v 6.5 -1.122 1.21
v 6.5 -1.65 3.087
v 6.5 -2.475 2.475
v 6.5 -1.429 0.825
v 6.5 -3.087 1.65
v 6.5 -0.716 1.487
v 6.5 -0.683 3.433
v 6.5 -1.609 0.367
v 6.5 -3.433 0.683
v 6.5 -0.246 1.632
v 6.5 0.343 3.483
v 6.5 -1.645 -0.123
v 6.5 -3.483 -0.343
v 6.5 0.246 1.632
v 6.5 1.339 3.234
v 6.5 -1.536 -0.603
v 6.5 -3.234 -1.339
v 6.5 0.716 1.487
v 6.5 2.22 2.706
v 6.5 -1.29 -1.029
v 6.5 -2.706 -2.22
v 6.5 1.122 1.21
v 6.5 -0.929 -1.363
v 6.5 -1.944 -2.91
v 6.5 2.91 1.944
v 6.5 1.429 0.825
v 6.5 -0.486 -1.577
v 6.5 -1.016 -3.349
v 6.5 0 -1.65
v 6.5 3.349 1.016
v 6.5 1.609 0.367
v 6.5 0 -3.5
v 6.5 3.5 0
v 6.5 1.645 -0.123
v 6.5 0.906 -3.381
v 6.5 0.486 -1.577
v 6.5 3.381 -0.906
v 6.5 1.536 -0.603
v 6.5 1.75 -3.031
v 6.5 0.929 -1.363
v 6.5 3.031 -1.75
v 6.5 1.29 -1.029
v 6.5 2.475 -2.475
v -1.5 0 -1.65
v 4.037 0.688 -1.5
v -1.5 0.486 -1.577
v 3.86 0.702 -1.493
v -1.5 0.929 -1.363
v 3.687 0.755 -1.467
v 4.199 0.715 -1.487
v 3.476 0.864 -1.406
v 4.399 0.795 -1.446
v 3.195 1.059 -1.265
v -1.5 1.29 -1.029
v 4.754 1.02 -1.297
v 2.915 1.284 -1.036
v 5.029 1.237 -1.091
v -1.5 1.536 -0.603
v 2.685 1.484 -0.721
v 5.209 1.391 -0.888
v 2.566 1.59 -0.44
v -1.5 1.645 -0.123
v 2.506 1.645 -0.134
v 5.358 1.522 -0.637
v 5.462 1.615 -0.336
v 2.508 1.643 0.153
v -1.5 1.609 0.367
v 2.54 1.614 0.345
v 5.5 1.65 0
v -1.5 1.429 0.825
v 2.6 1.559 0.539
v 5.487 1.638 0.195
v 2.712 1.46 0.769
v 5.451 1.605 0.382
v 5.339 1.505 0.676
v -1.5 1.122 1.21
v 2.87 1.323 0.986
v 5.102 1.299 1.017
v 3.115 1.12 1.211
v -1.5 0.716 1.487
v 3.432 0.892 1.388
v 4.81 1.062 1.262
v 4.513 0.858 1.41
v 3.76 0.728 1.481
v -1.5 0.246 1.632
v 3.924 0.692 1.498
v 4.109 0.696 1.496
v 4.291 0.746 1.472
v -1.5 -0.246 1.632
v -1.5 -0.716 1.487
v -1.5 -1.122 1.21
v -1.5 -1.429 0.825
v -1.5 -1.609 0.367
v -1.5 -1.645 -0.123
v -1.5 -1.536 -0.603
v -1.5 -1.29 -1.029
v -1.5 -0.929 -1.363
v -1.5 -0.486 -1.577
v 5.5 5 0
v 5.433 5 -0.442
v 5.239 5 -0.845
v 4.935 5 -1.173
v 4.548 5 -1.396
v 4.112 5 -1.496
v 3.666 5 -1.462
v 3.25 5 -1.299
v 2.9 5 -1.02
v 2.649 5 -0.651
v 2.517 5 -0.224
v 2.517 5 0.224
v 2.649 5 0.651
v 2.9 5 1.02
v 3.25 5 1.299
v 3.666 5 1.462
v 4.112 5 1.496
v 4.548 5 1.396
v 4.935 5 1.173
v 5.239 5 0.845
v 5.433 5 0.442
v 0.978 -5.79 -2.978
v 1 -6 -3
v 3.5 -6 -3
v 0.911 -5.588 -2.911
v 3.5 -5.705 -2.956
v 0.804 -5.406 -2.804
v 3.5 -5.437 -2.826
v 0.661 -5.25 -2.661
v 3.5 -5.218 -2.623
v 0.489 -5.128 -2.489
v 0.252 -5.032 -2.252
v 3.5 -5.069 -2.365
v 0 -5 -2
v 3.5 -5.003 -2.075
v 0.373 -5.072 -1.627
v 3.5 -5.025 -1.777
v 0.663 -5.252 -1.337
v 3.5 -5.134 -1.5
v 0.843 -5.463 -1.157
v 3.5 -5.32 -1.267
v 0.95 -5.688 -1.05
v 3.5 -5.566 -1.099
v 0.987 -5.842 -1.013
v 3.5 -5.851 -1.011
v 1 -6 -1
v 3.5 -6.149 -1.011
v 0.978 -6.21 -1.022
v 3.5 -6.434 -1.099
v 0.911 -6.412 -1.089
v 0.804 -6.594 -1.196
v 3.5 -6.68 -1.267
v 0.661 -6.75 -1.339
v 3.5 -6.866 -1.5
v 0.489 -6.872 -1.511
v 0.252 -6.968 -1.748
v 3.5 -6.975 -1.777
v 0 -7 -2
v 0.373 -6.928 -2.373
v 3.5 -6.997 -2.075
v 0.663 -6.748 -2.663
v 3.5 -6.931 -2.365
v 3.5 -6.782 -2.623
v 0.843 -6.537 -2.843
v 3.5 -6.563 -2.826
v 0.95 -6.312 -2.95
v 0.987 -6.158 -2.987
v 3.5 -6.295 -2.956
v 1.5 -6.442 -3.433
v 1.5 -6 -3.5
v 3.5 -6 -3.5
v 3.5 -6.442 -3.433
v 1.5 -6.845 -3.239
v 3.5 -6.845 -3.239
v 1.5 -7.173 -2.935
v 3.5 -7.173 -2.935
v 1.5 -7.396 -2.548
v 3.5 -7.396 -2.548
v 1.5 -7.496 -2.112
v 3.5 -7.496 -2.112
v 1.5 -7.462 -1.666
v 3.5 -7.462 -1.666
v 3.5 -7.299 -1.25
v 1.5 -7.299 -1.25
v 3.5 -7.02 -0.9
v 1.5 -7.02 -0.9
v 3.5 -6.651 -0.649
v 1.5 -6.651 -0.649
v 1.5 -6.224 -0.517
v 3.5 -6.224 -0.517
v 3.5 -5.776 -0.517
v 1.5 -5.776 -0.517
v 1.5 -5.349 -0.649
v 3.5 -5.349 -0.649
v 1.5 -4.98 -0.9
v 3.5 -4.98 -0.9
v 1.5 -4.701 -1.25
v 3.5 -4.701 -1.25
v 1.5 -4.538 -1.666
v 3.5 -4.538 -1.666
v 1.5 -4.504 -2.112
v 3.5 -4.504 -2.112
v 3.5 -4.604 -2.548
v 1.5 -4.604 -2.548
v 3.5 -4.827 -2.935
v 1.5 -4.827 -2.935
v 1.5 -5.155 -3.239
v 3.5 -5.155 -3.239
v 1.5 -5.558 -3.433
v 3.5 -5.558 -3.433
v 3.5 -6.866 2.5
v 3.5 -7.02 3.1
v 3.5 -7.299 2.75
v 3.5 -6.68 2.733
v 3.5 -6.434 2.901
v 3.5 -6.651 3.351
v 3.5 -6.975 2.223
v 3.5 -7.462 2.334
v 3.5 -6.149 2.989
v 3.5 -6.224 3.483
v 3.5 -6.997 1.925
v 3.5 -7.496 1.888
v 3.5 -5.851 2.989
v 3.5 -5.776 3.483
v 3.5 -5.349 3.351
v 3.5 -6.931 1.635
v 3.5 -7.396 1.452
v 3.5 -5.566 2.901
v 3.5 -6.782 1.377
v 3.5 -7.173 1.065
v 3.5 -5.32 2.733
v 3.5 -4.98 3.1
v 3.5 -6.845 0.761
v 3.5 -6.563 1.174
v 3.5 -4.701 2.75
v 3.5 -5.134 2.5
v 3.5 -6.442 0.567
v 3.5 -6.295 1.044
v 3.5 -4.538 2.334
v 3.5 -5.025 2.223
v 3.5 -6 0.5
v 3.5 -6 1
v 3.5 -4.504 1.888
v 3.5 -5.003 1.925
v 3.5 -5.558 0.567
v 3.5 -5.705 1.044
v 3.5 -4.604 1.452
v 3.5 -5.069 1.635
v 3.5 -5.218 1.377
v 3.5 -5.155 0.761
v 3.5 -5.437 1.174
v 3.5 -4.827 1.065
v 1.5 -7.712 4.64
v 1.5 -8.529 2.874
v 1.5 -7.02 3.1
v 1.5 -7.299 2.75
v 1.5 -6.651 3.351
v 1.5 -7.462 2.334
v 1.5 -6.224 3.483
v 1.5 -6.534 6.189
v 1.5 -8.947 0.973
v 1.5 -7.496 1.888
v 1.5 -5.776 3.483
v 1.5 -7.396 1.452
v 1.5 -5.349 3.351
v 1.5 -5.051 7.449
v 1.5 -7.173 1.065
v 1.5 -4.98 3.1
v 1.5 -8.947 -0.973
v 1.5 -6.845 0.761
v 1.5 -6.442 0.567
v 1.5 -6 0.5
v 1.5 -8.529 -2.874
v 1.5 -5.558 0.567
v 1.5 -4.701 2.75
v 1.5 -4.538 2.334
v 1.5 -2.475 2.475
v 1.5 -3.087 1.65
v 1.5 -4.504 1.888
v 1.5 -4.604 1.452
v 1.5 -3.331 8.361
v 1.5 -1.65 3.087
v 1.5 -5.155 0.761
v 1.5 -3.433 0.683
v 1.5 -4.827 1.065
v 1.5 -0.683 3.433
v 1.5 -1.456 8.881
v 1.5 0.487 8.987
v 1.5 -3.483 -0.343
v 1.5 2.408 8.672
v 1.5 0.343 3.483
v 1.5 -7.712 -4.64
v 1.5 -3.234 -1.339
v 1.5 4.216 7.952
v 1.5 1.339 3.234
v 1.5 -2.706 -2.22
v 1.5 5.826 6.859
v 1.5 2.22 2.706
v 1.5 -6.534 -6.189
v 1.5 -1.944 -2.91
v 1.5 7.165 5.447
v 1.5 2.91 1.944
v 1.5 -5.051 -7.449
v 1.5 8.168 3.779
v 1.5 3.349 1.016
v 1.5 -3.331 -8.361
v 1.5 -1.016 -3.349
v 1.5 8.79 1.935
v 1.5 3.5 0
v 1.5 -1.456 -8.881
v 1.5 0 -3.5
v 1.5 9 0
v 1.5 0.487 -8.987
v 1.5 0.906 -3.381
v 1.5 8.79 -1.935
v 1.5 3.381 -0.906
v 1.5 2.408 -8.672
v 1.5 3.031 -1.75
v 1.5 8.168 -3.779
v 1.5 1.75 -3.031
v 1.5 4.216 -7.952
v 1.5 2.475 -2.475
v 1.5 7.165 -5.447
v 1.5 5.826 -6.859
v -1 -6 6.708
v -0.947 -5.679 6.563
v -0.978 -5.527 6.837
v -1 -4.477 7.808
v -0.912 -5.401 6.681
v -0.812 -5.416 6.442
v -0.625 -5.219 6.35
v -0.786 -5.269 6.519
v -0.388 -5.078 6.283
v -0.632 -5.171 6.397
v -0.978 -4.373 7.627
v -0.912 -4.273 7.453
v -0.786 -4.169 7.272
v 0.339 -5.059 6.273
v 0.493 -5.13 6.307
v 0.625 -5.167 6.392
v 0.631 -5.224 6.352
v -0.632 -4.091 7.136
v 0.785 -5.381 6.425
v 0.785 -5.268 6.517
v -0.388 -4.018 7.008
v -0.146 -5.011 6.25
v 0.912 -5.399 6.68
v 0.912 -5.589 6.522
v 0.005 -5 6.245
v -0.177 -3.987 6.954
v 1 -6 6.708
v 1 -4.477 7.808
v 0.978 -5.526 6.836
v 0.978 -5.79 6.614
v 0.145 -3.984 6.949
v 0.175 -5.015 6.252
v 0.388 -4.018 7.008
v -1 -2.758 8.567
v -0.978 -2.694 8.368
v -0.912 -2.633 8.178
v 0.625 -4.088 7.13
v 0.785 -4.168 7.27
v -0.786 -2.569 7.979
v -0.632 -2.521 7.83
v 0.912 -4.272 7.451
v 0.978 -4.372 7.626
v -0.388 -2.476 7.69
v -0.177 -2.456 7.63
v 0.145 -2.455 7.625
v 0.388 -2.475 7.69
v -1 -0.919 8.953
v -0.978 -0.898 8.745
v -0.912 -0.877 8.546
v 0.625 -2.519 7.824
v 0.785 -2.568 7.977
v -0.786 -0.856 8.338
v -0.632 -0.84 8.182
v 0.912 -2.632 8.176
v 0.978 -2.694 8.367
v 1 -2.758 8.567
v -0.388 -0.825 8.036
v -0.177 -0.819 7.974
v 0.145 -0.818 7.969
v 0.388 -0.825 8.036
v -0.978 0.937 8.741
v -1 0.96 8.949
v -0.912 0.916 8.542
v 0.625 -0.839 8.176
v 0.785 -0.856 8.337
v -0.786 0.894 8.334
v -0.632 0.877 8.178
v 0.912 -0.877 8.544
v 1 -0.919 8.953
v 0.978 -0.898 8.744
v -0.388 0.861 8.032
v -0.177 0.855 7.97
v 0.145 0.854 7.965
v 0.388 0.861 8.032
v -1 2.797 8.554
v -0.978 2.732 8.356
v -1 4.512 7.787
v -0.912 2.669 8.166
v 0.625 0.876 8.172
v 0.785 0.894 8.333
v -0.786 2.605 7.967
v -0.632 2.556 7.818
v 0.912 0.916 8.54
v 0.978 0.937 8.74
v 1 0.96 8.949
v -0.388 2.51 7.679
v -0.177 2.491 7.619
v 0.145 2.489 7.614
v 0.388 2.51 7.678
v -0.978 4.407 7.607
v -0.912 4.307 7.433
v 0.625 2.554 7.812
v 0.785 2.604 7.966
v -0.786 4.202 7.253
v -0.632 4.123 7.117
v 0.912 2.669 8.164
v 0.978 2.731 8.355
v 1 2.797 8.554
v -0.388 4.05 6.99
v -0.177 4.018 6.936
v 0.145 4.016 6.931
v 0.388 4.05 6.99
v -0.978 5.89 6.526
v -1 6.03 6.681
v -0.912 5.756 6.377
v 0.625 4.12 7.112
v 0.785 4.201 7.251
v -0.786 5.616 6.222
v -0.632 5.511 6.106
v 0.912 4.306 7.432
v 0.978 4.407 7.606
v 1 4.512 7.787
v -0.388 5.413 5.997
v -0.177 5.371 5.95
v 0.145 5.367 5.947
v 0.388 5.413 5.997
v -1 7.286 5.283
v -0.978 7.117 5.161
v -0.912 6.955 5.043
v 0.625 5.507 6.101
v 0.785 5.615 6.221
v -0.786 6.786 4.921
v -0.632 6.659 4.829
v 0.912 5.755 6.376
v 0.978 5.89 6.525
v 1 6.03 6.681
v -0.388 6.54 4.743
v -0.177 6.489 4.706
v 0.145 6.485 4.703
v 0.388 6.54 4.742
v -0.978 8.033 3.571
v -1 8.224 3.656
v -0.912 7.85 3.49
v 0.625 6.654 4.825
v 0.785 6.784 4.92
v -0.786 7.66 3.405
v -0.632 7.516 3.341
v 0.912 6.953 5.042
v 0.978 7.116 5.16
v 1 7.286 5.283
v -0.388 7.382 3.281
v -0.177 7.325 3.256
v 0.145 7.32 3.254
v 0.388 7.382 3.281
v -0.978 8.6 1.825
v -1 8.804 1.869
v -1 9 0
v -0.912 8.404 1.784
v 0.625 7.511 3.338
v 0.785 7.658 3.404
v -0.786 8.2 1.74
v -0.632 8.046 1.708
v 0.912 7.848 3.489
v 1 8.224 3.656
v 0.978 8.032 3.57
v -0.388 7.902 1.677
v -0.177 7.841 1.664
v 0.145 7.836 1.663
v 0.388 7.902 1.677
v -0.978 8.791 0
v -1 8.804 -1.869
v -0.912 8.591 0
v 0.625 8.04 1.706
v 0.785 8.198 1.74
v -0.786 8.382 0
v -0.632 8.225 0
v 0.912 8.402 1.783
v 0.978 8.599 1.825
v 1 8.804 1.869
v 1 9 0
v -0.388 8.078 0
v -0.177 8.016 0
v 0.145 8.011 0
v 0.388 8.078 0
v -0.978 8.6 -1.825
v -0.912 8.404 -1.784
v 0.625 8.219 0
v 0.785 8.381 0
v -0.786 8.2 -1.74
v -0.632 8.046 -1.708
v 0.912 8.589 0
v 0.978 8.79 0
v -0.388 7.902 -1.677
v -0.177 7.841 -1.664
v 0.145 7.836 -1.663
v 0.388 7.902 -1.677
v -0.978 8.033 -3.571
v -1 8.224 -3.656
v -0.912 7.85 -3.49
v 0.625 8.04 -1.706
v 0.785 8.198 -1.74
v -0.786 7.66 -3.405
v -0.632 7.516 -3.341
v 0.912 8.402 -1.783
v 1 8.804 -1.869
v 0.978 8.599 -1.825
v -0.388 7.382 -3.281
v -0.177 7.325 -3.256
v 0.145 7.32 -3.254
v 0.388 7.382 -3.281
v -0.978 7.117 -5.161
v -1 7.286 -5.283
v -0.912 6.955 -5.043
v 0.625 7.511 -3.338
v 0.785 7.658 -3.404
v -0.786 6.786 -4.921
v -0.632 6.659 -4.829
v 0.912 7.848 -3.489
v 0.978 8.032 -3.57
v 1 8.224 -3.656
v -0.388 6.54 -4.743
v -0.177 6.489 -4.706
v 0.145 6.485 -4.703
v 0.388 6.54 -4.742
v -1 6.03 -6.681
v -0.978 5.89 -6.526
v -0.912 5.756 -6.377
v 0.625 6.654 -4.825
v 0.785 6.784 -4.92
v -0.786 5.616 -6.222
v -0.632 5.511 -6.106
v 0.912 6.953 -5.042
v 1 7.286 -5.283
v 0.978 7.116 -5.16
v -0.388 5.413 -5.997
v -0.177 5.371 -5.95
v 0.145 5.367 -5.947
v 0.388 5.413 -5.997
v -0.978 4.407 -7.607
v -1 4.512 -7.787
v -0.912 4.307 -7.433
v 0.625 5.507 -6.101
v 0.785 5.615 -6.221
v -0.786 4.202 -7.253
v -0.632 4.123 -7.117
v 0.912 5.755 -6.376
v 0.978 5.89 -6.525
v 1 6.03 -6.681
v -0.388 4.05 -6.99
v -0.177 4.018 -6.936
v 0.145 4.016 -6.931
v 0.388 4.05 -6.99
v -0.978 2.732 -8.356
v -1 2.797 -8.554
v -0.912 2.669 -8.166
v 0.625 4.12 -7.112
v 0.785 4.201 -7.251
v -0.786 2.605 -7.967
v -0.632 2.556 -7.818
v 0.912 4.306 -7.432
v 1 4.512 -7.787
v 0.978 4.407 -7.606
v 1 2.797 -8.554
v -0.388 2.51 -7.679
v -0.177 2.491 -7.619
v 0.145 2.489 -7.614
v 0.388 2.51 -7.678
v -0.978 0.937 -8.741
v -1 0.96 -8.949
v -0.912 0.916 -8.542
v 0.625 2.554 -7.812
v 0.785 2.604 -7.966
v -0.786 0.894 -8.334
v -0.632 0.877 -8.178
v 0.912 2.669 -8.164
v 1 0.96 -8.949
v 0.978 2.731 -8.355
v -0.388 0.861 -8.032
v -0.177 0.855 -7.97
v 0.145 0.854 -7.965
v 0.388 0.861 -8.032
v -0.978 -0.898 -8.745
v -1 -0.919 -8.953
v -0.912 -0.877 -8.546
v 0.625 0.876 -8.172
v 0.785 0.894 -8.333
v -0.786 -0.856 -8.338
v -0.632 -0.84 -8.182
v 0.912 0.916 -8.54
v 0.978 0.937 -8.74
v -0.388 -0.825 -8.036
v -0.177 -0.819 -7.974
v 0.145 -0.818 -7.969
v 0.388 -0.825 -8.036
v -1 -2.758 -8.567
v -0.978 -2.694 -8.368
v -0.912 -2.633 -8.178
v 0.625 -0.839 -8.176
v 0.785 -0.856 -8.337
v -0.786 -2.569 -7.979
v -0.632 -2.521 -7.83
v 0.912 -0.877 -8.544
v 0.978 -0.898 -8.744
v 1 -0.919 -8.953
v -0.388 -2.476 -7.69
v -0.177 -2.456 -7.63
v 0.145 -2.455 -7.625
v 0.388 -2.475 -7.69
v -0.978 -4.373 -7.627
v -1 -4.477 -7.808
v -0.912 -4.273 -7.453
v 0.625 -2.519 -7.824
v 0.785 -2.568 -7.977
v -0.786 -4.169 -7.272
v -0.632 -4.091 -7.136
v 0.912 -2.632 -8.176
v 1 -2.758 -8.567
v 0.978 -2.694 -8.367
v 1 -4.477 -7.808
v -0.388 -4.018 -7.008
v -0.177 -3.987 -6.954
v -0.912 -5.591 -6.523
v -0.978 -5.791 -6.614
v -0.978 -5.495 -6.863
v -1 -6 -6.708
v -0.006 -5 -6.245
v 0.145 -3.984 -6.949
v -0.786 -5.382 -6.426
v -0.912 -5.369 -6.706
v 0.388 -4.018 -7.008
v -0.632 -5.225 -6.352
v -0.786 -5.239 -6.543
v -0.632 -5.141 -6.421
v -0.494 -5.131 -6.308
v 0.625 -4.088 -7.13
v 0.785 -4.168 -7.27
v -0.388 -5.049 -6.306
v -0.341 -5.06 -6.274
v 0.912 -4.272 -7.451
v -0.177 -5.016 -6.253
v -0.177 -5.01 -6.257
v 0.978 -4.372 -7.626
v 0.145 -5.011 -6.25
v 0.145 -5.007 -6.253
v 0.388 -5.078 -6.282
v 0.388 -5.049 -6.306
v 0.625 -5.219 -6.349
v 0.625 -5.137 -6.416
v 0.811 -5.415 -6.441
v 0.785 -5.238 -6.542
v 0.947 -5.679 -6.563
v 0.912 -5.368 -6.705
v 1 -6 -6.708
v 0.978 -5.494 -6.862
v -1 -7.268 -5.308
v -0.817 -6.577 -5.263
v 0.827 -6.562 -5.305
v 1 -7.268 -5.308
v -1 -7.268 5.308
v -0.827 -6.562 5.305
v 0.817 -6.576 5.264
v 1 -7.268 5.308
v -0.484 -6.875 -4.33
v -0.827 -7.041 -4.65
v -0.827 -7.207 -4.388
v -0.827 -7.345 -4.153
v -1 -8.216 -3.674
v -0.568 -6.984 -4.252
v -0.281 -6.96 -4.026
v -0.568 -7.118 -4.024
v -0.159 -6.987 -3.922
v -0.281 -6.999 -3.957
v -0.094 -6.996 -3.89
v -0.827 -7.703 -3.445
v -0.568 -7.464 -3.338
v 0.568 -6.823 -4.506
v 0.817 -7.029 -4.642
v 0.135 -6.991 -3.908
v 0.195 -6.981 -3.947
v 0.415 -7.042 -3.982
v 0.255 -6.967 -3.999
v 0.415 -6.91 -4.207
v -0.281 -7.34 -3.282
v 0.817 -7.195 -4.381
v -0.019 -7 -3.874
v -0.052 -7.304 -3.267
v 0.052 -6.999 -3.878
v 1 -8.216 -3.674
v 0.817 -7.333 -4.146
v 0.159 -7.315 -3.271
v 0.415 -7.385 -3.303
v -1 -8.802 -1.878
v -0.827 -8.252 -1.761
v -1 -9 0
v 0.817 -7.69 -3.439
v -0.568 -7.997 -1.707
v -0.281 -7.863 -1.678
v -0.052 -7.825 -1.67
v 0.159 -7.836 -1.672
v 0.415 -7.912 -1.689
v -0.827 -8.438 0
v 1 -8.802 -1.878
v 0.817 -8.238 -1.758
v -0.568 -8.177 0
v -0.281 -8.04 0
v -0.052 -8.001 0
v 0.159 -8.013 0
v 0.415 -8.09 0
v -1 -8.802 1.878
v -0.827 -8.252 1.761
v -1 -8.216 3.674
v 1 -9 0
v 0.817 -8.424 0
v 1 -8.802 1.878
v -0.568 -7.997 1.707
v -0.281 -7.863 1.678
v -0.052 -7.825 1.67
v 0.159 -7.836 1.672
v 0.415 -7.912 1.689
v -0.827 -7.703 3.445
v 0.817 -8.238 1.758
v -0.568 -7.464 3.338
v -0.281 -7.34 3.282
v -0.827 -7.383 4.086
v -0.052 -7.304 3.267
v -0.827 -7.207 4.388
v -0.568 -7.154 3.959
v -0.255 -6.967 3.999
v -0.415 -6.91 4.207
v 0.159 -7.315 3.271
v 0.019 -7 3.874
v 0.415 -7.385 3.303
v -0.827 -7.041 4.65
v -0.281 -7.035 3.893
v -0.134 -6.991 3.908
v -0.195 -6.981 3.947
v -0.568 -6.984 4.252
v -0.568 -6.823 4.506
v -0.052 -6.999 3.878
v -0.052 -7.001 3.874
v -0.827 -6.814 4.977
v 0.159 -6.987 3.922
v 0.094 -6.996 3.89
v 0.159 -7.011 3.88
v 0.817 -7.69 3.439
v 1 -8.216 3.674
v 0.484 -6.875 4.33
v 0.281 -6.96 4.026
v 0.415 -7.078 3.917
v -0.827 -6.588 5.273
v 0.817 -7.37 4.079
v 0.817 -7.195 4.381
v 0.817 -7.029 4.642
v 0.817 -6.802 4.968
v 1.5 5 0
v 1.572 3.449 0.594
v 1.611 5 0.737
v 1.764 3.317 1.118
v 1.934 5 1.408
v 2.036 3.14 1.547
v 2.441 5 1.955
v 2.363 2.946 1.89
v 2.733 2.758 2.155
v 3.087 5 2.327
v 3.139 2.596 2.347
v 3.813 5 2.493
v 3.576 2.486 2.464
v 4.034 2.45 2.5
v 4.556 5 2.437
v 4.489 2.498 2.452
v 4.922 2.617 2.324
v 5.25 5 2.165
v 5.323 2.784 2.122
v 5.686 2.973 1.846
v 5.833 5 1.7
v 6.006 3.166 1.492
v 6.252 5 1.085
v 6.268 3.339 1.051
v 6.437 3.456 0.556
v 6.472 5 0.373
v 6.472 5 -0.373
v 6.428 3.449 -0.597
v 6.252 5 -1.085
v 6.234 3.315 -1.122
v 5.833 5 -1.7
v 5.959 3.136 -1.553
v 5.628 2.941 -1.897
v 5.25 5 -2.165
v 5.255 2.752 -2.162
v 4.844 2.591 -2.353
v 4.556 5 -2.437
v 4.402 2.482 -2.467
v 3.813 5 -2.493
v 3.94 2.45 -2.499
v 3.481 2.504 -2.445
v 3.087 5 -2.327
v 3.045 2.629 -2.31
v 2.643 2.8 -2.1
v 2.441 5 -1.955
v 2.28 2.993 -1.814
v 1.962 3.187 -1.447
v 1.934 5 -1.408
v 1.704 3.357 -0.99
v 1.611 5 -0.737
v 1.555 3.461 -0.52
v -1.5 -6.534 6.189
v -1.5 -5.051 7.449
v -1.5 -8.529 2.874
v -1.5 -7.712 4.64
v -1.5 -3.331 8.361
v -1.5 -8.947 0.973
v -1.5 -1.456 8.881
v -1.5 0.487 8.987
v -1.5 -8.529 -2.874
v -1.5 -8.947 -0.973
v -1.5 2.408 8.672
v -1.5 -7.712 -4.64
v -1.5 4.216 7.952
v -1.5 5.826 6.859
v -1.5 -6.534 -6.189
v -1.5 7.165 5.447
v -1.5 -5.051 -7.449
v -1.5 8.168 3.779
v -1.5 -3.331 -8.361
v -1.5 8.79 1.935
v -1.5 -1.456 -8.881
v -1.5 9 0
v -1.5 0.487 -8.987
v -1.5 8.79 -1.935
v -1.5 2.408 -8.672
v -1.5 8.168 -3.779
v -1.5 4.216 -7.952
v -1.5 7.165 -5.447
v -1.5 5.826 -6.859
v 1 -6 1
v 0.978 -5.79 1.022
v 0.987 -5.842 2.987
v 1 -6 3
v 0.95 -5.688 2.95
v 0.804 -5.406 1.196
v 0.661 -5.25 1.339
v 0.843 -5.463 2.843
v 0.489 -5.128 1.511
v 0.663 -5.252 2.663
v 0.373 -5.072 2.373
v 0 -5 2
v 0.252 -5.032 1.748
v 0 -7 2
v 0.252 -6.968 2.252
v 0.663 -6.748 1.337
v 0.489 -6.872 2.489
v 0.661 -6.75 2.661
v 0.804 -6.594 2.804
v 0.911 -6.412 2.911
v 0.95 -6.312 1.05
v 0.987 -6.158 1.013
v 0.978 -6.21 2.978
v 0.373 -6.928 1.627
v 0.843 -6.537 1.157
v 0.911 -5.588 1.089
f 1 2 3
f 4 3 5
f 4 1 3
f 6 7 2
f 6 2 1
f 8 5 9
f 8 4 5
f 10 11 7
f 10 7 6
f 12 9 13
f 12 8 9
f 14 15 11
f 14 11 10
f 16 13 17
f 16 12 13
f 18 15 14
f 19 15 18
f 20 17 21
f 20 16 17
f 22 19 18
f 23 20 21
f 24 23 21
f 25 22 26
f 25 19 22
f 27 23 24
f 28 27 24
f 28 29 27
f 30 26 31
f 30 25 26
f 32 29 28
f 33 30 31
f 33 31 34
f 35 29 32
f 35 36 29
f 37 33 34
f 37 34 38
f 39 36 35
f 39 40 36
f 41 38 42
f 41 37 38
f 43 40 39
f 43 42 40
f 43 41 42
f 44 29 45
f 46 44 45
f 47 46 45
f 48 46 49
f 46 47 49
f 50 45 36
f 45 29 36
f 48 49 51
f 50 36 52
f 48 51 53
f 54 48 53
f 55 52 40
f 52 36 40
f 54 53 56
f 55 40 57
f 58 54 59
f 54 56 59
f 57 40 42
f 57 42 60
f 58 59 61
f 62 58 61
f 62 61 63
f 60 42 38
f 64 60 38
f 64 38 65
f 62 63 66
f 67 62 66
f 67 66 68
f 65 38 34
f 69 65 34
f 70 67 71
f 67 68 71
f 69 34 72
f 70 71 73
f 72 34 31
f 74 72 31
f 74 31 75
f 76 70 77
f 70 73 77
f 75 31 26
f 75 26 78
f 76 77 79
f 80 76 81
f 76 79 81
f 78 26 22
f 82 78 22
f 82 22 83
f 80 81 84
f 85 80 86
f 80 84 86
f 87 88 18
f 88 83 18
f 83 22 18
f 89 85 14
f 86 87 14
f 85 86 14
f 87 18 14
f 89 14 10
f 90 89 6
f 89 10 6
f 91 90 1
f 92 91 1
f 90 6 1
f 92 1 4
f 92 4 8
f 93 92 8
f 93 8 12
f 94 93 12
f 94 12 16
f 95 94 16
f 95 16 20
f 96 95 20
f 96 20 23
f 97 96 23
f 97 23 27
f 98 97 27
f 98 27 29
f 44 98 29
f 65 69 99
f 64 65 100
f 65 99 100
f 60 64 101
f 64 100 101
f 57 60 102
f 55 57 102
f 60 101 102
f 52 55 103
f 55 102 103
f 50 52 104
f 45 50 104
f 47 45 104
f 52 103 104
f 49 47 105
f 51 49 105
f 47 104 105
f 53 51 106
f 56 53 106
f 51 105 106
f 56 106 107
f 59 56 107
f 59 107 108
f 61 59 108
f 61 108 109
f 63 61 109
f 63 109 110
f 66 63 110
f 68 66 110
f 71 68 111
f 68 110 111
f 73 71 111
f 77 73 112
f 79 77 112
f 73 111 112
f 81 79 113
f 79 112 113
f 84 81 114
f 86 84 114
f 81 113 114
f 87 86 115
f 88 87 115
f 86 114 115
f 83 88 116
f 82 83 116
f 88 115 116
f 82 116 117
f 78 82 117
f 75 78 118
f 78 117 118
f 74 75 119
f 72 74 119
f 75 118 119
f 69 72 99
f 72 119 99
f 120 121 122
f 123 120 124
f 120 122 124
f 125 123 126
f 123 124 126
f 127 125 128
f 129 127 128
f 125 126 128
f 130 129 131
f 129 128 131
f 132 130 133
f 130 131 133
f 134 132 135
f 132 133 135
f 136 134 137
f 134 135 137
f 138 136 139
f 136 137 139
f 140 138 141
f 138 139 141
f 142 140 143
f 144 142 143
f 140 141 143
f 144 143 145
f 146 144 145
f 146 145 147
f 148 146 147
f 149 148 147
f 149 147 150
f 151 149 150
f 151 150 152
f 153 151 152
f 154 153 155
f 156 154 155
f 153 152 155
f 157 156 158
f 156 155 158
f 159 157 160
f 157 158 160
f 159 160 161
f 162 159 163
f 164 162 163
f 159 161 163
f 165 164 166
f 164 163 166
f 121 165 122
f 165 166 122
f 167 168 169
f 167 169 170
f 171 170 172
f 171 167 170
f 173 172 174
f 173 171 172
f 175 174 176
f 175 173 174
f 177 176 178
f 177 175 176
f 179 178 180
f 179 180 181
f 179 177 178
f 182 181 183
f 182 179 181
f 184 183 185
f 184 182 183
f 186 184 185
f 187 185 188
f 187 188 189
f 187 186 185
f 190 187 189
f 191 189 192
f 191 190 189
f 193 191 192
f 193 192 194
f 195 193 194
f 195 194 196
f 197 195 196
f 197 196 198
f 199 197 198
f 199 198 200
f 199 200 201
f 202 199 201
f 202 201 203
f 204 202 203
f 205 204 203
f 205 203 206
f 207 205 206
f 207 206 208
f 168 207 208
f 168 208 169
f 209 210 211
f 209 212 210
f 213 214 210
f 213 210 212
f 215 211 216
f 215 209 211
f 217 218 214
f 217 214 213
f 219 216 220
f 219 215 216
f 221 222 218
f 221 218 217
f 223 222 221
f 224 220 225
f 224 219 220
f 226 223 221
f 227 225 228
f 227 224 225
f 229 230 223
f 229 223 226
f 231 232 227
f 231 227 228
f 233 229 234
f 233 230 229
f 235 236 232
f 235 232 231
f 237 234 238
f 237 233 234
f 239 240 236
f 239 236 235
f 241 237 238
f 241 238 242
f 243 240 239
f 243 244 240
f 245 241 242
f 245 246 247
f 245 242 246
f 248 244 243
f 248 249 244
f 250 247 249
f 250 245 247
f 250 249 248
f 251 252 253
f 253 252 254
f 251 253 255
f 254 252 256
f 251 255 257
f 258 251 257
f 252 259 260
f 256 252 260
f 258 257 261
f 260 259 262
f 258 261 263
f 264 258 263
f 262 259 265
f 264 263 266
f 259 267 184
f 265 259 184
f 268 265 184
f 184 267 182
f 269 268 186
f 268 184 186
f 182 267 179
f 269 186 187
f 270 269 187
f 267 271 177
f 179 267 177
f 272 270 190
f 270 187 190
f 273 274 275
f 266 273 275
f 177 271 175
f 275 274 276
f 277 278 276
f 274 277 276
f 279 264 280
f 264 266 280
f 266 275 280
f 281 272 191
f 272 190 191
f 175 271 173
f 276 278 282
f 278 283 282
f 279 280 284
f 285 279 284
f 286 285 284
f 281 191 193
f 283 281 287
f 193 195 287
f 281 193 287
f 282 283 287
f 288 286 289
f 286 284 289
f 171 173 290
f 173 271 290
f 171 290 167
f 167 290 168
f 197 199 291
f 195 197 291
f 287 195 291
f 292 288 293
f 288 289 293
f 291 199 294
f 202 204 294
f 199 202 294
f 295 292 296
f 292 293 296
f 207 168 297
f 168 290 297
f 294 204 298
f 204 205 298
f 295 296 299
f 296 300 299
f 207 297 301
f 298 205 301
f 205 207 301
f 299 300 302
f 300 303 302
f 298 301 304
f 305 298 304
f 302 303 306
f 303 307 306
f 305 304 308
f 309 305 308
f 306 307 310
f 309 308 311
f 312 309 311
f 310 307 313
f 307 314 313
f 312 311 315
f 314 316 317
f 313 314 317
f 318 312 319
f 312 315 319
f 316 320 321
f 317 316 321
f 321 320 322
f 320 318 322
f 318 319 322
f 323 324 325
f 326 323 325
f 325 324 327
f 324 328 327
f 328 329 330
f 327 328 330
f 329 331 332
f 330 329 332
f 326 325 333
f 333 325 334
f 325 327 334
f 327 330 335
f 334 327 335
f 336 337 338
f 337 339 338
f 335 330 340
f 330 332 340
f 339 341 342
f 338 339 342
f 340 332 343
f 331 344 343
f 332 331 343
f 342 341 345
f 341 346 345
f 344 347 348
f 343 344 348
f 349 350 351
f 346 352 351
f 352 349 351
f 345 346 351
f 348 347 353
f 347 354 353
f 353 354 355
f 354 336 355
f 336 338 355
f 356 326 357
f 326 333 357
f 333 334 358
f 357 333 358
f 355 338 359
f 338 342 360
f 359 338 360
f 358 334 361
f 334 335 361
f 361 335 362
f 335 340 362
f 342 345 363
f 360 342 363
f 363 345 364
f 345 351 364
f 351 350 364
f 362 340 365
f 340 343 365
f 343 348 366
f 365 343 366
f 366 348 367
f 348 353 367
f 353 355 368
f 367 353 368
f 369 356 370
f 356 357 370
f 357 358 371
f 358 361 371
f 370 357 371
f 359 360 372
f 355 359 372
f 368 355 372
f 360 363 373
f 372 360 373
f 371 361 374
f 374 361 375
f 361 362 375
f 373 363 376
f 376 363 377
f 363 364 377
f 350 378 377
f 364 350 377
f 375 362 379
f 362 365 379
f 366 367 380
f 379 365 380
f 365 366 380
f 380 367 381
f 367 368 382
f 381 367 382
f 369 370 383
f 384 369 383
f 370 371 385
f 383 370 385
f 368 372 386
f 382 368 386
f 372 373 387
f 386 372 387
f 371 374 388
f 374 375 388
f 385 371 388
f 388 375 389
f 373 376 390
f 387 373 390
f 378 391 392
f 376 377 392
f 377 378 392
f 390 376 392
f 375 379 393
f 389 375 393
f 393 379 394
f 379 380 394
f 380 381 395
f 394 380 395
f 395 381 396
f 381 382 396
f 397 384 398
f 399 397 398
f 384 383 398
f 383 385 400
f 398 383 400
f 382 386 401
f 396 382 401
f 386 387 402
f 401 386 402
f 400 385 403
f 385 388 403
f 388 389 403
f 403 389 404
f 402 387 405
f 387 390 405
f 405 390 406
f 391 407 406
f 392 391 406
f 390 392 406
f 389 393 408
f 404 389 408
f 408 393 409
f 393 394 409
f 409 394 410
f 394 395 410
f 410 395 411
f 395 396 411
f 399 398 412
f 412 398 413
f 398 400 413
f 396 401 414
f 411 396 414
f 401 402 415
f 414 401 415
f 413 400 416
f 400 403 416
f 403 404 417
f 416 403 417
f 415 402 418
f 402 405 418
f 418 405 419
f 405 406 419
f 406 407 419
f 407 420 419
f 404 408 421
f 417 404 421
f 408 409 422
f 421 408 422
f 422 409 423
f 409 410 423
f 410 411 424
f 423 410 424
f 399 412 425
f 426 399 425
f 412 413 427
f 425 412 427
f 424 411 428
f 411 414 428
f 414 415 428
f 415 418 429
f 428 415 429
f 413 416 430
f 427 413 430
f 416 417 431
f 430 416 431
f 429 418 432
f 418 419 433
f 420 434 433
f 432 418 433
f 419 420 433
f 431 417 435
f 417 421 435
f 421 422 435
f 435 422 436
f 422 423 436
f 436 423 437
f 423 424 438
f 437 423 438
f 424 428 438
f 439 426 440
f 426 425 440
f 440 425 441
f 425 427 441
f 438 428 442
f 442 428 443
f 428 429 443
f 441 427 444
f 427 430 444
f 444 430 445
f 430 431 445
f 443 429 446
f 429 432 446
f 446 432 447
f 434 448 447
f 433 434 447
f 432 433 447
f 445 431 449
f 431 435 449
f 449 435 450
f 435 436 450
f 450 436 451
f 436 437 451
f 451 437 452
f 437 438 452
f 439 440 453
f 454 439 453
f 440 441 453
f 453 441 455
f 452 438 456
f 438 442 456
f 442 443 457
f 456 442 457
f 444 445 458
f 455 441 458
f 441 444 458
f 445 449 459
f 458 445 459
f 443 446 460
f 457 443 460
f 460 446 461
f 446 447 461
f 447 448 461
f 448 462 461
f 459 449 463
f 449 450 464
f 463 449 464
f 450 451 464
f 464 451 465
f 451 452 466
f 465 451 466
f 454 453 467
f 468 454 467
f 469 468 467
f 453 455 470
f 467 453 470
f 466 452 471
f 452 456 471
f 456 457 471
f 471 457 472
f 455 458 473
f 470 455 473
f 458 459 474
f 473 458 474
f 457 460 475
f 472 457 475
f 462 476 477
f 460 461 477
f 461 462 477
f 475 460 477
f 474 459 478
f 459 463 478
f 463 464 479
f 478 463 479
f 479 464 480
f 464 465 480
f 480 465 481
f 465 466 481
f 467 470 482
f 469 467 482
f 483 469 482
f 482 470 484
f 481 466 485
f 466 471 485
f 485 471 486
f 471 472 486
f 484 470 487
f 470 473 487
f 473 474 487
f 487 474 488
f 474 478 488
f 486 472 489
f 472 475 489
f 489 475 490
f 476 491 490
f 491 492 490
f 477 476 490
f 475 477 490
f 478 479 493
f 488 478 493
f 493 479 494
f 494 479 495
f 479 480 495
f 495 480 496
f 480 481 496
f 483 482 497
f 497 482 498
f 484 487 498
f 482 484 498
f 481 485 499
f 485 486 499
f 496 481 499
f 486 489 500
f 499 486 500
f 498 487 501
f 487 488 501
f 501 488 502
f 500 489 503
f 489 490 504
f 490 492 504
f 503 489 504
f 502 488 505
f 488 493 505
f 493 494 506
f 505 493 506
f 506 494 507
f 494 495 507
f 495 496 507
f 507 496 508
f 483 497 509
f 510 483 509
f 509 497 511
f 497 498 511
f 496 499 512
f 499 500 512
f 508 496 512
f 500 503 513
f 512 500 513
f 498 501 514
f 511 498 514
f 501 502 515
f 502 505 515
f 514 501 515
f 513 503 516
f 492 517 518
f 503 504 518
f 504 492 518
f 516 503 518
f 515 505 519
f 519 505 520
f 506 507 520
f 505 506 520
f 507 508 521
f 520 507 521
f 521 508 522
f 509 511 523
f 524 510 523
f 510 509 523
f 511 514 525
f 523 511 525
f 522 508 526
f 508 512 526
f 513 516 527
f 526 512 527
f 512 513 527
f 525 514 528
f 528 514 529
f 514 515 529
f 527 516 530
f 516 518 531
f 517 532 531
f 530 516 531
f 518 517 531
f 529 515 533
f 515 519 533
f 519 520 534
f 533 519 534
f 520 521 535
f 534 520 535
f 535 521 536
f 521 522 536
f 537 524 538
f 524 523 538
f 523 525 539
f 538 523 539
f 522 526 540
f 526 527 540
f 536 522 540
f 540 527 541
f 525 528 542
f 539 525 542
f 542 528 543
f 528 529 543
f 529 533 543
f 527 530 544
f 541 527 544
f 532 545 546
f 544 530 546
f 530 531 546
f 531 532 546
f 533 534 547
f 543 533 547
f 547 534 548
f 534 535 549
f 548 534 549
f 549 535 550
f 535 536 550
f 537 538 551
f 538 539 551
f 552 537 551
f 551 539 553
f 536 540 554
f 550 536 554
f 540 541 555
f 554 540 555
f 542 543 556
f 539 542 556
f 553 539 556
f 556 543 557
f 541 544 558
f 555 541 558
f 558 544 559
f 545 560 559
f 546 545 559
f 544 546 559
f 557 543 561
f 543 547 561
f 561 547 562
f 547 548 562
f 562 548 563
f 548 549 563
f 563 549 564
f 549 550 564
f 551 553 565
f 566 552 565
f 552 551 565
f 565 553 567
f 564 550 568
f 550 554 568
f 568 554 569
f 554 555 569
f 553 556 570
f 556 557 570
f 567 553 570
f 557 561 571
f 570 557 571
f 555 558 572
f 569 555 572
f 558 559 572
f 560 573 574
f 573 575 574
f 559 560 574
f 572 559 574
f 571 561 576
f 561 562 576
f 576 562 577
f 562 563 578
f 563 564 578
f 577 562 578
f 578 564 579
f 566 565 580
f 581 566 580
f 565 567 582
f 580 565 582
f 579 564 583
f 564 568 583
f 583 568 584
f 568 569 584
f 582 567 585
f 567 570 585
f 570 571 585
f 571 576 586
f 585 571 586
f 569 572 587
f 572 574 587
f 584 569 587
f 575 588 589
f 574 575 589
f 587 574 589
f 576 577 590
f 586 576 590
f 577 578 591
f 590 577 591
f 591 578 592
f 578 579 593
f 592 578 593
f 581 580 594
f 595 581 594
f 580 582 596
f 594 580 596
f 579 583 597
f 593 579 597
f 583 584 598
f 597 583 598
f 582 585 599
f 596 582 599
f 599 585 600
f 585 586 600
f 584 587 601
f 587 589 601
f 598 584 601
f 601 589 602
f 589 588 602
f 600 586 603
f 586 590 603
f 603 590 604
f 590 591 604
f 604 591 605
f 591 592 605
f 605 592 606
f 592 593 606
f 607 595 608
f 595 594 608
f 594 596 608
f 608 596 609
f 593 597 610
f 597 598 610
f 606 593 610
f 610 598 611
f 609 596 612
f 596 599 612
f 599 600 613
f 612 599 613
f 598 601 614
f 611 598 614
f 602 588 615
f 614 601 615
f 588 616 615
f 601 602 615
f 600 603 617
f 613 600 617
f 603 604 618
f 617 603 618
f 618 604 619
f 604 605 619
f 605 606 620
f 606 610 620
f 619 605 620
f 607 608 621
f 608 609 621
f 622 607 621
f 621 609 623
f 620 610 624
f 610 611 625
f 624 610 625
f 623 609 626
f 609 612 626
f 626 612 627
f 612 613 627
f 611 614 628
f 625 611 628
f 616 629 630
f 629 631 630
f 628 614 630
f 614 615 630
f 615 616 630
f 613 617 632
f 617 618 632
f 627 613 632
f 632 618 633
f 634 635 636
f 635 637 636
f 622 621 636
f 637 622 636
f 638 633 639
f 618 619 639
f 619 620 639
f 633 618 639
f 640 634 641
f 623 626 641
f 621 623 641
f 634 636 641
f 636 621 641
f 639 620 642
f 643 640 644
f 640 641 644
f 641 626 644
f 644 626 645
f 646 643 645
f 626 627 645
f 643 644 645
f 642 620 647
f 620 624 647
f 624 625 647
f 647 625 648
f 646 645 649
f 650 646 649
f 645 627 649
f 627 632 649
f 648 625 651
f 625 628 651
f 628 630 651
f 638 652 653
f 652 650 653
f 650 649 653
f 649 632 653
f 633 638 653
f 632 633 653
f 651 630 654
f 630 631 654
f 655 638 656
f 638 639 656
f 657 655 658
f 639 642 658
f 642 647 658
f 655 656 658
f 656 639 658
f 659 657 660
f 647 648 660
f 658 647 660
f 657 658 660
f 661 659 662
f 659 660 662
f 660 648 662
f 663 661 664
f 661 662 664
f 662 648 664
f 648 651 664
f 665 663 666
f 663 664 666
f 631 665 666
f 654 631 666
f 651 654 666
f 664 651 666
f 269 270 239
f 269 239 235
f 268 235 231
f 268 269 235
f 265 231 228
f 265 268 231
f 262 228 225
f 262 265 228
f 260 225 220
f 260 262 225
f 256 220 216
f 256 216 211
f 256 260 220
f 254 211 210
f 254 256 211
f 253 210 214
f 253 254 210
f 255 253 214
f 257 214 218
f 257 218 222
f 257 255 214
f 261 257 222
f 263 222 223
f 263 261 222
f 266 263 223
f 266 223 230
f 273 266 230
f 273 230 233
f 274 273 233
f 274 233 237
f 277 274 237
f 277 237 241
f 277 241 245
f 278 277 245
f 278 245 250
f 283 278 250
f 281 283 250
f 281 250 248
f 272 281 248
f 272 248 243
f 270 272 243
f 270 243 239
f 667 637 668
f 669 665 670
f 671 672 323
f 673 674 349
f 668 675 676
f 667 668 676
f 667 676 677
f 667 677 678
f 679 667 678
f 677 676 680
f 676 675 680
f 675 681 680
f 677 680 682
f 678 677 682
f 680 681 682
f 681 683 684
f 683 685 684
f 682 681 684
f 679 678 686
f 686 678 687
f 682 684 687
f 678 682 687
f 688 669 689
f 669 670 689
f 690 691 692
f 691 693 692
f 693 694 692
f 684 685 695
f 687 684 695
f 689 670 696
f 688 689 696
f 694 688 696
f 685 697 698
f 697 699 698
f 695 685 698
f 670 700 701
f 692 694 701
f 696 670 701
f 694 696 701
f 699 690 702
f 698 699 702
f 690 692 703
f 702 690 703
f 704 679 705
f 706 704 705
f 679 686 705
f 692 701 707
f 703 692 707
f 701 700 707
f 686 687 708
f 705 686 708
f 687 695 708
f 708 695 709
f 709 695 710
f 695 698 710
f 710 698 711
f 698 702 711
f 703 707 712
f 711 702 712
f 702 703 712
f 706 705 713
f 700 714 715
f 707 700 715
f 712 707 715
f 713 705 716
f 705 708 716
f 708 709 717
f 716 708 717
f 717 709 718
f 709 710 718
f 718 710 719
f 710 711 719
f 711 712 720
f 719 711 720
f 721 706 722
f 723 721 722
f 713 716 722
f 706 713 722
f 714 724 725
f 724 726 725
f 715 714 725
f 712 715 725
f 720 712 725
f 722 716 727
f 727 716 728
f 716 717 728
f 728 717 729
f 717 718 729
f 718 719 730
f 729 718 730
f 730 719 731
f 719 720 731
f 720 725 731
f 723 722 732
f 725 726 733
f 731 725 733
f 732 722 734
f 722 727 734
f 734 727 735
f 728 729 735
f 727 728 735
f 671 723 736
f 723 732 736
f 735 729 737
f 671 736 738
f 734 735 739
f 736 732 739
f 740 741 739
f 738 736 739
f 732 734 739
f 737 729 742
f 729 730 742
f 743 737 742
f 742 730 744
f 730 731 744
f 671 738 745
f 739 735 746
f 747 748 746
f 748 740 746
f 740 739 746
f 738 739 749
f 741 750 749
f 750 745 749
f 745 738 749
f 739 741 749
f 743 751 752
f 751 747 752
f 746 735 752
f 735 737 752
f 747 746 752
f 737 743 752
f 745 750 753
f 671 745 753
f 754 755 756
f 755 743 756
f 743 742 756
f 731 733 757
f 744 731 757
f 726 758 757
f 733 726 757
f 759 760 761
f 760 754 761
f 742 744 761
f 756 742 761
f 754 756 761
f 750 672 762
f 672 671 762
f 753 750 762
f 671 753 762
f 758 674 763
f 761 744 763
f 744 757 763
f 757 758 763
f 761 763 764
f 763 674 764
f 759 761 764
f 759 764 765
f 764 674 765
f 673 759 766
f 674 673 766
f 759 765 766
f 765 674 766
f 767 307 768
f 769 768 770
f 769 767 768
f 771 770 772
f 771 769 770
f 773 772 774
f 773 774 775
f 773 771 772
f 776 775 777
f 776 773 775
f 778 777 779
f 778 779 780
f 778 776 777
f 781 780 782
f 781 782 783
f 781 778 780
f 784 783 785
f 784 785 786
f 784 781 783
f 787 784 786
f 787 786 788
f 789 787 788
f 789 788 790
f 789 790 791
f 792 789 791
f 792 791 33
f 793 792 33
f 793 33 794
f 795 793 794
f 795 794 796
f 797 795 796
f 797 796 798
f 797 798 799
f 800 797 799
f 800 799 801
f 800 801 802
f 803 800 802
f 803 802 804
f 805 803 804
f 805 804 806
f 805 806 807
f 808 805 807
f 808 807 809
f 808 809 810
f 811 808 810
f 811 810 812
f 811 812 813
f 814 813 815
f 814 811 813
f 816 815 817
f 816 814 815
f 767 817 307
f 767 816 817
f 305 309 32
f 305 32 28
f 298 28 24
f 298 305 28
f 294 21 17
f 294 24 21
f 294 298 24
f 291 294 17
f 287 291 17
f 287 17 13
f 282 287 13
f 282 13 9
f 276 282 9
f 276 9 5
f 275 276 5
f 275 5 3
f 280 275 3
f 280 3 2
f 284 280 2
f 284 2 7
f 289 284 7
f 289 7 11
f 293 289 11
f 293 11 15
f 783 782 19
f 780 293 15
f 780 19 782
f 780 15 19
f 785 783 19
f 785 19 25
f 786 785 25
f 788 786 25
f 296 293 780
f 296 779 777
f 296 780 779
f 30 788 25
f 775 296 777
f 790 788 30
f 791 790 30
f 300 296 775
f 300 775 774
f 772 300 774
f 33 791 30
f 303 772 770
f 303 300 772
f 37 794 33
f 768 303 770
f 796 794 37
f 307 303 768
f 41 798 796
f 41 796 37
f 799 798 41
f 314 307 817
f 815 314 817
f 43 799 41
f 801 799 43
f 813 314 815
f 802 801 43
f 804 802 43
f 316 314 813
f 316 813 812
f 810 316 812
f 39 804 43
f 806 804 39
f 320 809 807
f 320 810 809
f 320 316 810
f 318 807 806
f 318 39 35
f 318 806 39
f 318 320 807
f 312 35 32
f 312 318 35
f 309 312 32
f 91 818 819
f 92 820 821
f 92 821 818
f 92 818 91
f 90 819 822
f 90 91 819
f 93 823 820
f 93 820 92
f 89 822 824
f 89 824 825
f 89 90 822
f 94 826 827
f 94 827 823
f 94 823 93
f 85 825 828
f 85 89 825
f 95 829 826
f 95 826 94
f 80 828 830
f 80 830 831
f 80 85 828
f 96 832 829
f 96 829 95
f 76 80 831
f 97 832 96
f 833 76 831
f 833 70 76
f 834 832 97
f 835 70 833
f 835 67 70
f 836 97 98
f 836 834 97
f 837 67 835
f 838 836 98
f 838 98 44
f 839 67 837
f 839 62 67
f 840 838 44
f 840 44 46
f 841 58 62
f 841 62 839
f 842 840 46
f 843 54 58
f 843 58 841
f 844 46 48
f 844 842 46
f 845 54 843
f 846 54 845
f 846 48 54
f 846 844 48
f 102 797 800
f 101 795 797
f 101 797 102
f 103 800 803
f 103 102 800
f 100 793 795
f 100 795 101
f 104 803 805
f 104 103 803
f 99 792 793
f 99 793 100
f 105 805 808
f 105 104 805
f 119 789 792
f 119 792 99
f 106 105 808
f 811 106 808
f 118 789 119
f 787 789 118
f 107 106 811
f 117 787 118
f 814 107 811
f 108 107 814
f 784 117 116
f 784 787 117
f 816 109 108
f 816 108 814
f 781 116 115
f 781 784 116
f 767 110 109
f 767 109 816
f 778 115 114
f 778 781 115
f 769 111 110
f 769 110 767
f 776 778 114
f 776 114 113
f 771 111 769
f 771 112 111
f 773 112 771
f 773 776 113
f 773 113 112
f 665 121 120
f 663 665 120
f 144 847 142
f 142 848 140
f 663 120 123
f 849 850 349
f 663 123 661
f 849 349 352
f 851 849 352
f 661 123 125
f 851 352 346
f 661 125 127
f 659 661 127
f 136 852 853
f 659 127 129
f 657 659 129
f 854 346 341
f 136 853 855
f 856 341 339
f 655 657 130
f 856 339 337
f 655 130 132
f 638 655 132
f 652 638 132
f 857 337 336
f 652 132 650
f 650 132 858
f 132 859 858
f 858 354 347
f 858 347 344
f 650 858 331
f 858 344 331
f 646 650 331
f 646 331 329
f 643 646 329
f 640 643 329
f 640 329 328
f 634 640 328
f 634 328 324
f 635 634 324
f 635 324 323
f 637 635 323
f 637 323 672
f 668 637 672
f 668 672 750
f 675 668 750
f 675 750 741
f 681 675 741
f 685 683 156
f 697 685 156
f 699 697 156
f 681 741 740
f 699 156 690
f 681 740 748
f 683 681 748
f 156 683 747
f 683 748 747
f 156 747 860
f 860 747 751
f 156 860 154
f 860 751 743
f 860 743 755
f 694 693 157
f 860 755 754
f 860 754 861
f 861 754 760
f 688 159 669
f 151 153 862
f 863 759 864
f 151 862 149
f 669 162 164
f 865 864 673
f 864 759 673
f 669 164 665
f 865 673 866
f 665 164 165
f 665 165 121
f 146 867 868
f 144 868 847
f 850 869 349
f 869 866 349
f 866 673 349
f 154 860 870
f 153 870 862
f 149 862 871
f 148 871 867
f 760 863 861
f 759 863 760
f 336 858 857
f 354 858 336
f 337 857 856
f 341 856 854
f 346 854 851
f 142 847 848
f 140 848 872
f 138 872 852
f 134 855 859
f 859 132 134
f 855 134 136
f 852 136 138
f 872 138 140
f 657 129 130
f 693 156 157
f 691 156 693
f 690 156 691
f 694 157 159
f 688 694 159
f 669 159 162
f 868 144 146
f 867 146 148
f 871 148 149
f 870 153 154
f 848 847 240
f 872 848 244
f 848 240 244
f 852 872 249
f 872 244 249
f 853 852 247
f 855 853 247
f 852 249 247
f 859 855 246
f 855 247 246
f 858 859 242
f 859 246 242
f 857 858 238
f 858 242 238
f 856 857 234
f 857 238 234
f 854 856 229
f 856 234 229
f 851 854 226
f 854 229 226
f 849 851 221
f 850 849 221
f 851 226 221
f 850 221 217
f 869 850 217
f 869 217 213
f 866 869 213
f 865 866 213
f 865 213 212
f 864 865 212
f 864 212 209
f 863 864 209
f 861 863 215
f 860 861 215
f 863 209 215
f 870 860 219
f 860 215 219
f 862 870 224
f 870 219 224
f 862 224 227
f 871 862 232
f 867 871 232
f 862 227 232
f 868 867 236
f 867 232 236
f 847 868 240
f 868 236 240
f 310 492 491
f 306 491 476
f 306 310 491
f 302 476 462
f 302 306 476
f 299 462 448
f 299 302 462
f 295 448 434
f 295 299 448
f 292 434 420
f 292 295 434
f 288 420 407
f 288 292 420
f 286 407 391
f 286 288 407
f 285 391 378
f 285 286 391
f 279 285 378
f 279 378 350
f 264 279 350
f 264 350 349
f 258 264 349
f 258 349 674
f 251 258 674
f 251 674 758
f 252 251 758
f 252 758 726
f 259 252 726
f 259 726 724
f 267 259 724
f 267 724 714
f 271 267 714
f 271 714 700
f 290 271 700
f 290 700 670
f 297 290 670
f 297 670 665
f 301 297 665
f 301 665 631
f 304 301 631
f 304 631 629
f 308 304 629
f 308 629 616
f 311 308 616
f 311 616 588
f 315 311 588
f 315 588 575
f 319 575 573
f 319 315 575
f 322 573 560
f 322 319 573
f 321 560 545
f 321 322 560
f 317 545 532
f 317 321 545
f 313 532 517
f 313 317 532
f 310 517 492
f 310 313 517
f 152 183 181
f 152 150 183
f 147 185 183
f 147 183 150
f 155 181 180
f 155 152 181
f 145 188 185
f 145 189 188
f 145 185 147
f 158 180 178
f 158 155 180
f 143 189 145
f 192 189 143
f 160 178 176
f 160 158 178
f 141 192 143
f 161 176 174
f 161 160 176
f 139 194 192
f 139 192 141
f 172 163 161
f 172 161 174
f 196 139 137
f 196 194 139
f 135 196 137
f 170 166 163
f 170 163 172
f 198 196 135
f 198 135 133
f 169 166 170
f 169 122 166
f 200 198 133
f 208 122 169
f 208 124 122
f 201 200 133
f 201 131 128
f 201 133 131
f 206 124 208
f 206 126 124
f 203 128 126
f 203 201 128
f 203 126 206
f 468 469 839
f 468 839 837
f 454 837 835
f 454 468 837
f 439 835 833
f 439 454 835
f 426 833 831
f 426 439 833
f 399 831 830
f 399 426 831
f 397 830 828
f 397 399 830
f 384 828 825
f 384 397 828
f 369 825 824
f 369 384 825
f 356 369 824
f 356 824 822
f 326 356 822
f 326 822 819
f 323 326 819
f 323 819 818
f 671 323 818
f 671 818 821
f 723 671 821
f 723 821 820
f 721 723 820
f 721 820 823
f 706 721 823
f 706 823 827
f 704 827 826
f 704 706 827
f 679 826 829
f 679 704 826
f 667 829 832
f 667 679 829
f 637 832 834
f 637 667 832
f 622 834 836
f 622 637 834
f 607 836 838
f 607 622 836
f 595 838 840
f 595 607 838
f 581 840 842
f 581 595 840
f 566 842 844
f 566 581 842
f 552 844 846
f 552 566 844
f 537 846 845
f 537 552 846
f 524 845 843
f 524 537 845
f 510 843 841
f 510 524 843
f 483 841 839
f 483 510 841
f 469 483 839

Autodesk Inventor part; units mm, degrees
ref_plane "YZ Plane" through (0, 0, 0) normal (1, 0, 0) x (0, 1, 0)
ref_plane "XY Plane" through (0, 0, 0) normal (0, 0, 1) x (1, 0, 0)
sketch "Sketch1" plane through (0, 0, 0) normal (0, 0, 1) x (1, 0, 0)
  line L0 (0, 0) -> (0, 9)
  circle A0 centre (0, 9) radius 1
  line L1 (0, 9) -> (1.5, 9)
  line L2 (1.5, 9) -> (1.5, 0)
  line L3 (1.5, 0) -> (0, 0)
  line L4 (0, 0) -> (-1.5, 0)
  line L5 (-1.5, 0) -> (-1.5, 9)
  line L6 (-1.5, 9) -> (-1, 9)
  point P0 (0.5, 7.5858)
  point P1 (-0.5, 7.5858)
  point P2 (1, 9)
  point P3 (0, 8)
  dimension "d1" = 2
  dimension "d0" = 9
  dimension "d2" = 1.5
  dimension "d3" = 1.5
revolve "Revolution1" add sketch "Sketch1" angle 360 about axis through (1.5, 0, 0) along (-1, 0, 0) contours L4 L5 L6 A0 L0 | L0 A0 L1 L2 L3
sketch "Sketch6" plane through (0, 0, 0) normal (0, 0, 1) x (1, 0, 0)
  line L0 (0, 0) -> (0, -6)
  circle A0 centre (0, -6) radius 1
  dimension "d14" = 6
  dimension "d15" = 2
extrude "Extrusion4" cut sketch "Sketch6" against normal through all both and the other way through all
sketch "Sketch7" plane through (1.5, 0, 0) normal (1, 0, 0) x (0, 0, -1)
  line L0 (-6.245, -5) -> (6.245, -5) projected
  line L1 (0, -5) -> (0, -7)
  line L2 (-3.873, -7) -> (3.873, -7) projected
  line L3 (0, -6) -> (-2, -6)
  line L4 (0, -6) -> (2, -6)
  circle A0 centre (-2, -6) radius 1.5
  circle A1 centre (2, -6) radius 1.5
  point P0 (0, 0)
  dimension "d18" = 2
  dimension "d19" = 2
  dimension "d20" = 3
  dimension "d21" = 3
extrude "Extrusion5" add sketch "Sketch7" along normal blind 2 contours A0 L0 | L0 A0 L2 | L2 A0 | A1 L0 | L0 A1 L2 | L2 A1
sketch "Sketch8" plane through (3.5, -6, -2) normal (1, 0, 0) x (0, 0, -1)
  circle A0 centre (0, 0) radius 1
  circle A1 centre (-4, 0) radius 1.5 projected
  circle A2 centre (-4, 0) radius 1
  point P0 (-2, 6)
  dimension "d24" = 2
  dimension "d25" = 2
extrude "Extrusion6" cut sketch "Sketch8" against normal up to surface contours A0 | A2
sketch "Sketch9" plane through (1.5, 0, 0) normal (1, 0, 0) x (0, 0, -1)
  circle A0 centre (0, 0) radius 3.5
  dimension "d28" = 7
extrude "Extrusion7" add sketch "Sketch9" along normal blind 5
sketch "Sketch10" plane through (6.5, 0, 0) normal (1, 0, 0) x (0, 0, -1)
  circle A0 centre (0, 0) radius 1.65
  dimension "d31" = 3.3
extrude "Extrusion8" cut sketch "Sketch10" against normal through all
ref_plane "Work Plane1" through (0, 5, 0) normal (0, 1, 0) x (-1, 0, 0)
sketch "Sketch12" plane through (0, 5, 0) normal (0, 1, 0) x (-1, 0, 0)
  line L0 (-6.5, -1.65) -> (-6.5, 1.65) projected
  line L1 (-6.5, 0) -> (-1.5, 0)
  line L2 (-1.5, 9) -> (-1.5, -9) projected
  circle A0 centre (-4, 0) radius 2.5
  point P0 (0, 0)
  dimension "d36" = 5
extrude "Extrusion9" add sketch "Sketch12" against normal up to surface
sketch "Sketch13" plane through (4, 5, 0) normal (0, 1, 0) x (1, 0, 0)
  circle A0 centre (0, 0) radius 1.5
  point P0 (-4, 0)
  dimension "d39" = 3
extrude "Extrusion10" cut sketch "Sketch13" against normal up to surface
equation "\"d3\" = d2"
properties part number "finger_pulley"
